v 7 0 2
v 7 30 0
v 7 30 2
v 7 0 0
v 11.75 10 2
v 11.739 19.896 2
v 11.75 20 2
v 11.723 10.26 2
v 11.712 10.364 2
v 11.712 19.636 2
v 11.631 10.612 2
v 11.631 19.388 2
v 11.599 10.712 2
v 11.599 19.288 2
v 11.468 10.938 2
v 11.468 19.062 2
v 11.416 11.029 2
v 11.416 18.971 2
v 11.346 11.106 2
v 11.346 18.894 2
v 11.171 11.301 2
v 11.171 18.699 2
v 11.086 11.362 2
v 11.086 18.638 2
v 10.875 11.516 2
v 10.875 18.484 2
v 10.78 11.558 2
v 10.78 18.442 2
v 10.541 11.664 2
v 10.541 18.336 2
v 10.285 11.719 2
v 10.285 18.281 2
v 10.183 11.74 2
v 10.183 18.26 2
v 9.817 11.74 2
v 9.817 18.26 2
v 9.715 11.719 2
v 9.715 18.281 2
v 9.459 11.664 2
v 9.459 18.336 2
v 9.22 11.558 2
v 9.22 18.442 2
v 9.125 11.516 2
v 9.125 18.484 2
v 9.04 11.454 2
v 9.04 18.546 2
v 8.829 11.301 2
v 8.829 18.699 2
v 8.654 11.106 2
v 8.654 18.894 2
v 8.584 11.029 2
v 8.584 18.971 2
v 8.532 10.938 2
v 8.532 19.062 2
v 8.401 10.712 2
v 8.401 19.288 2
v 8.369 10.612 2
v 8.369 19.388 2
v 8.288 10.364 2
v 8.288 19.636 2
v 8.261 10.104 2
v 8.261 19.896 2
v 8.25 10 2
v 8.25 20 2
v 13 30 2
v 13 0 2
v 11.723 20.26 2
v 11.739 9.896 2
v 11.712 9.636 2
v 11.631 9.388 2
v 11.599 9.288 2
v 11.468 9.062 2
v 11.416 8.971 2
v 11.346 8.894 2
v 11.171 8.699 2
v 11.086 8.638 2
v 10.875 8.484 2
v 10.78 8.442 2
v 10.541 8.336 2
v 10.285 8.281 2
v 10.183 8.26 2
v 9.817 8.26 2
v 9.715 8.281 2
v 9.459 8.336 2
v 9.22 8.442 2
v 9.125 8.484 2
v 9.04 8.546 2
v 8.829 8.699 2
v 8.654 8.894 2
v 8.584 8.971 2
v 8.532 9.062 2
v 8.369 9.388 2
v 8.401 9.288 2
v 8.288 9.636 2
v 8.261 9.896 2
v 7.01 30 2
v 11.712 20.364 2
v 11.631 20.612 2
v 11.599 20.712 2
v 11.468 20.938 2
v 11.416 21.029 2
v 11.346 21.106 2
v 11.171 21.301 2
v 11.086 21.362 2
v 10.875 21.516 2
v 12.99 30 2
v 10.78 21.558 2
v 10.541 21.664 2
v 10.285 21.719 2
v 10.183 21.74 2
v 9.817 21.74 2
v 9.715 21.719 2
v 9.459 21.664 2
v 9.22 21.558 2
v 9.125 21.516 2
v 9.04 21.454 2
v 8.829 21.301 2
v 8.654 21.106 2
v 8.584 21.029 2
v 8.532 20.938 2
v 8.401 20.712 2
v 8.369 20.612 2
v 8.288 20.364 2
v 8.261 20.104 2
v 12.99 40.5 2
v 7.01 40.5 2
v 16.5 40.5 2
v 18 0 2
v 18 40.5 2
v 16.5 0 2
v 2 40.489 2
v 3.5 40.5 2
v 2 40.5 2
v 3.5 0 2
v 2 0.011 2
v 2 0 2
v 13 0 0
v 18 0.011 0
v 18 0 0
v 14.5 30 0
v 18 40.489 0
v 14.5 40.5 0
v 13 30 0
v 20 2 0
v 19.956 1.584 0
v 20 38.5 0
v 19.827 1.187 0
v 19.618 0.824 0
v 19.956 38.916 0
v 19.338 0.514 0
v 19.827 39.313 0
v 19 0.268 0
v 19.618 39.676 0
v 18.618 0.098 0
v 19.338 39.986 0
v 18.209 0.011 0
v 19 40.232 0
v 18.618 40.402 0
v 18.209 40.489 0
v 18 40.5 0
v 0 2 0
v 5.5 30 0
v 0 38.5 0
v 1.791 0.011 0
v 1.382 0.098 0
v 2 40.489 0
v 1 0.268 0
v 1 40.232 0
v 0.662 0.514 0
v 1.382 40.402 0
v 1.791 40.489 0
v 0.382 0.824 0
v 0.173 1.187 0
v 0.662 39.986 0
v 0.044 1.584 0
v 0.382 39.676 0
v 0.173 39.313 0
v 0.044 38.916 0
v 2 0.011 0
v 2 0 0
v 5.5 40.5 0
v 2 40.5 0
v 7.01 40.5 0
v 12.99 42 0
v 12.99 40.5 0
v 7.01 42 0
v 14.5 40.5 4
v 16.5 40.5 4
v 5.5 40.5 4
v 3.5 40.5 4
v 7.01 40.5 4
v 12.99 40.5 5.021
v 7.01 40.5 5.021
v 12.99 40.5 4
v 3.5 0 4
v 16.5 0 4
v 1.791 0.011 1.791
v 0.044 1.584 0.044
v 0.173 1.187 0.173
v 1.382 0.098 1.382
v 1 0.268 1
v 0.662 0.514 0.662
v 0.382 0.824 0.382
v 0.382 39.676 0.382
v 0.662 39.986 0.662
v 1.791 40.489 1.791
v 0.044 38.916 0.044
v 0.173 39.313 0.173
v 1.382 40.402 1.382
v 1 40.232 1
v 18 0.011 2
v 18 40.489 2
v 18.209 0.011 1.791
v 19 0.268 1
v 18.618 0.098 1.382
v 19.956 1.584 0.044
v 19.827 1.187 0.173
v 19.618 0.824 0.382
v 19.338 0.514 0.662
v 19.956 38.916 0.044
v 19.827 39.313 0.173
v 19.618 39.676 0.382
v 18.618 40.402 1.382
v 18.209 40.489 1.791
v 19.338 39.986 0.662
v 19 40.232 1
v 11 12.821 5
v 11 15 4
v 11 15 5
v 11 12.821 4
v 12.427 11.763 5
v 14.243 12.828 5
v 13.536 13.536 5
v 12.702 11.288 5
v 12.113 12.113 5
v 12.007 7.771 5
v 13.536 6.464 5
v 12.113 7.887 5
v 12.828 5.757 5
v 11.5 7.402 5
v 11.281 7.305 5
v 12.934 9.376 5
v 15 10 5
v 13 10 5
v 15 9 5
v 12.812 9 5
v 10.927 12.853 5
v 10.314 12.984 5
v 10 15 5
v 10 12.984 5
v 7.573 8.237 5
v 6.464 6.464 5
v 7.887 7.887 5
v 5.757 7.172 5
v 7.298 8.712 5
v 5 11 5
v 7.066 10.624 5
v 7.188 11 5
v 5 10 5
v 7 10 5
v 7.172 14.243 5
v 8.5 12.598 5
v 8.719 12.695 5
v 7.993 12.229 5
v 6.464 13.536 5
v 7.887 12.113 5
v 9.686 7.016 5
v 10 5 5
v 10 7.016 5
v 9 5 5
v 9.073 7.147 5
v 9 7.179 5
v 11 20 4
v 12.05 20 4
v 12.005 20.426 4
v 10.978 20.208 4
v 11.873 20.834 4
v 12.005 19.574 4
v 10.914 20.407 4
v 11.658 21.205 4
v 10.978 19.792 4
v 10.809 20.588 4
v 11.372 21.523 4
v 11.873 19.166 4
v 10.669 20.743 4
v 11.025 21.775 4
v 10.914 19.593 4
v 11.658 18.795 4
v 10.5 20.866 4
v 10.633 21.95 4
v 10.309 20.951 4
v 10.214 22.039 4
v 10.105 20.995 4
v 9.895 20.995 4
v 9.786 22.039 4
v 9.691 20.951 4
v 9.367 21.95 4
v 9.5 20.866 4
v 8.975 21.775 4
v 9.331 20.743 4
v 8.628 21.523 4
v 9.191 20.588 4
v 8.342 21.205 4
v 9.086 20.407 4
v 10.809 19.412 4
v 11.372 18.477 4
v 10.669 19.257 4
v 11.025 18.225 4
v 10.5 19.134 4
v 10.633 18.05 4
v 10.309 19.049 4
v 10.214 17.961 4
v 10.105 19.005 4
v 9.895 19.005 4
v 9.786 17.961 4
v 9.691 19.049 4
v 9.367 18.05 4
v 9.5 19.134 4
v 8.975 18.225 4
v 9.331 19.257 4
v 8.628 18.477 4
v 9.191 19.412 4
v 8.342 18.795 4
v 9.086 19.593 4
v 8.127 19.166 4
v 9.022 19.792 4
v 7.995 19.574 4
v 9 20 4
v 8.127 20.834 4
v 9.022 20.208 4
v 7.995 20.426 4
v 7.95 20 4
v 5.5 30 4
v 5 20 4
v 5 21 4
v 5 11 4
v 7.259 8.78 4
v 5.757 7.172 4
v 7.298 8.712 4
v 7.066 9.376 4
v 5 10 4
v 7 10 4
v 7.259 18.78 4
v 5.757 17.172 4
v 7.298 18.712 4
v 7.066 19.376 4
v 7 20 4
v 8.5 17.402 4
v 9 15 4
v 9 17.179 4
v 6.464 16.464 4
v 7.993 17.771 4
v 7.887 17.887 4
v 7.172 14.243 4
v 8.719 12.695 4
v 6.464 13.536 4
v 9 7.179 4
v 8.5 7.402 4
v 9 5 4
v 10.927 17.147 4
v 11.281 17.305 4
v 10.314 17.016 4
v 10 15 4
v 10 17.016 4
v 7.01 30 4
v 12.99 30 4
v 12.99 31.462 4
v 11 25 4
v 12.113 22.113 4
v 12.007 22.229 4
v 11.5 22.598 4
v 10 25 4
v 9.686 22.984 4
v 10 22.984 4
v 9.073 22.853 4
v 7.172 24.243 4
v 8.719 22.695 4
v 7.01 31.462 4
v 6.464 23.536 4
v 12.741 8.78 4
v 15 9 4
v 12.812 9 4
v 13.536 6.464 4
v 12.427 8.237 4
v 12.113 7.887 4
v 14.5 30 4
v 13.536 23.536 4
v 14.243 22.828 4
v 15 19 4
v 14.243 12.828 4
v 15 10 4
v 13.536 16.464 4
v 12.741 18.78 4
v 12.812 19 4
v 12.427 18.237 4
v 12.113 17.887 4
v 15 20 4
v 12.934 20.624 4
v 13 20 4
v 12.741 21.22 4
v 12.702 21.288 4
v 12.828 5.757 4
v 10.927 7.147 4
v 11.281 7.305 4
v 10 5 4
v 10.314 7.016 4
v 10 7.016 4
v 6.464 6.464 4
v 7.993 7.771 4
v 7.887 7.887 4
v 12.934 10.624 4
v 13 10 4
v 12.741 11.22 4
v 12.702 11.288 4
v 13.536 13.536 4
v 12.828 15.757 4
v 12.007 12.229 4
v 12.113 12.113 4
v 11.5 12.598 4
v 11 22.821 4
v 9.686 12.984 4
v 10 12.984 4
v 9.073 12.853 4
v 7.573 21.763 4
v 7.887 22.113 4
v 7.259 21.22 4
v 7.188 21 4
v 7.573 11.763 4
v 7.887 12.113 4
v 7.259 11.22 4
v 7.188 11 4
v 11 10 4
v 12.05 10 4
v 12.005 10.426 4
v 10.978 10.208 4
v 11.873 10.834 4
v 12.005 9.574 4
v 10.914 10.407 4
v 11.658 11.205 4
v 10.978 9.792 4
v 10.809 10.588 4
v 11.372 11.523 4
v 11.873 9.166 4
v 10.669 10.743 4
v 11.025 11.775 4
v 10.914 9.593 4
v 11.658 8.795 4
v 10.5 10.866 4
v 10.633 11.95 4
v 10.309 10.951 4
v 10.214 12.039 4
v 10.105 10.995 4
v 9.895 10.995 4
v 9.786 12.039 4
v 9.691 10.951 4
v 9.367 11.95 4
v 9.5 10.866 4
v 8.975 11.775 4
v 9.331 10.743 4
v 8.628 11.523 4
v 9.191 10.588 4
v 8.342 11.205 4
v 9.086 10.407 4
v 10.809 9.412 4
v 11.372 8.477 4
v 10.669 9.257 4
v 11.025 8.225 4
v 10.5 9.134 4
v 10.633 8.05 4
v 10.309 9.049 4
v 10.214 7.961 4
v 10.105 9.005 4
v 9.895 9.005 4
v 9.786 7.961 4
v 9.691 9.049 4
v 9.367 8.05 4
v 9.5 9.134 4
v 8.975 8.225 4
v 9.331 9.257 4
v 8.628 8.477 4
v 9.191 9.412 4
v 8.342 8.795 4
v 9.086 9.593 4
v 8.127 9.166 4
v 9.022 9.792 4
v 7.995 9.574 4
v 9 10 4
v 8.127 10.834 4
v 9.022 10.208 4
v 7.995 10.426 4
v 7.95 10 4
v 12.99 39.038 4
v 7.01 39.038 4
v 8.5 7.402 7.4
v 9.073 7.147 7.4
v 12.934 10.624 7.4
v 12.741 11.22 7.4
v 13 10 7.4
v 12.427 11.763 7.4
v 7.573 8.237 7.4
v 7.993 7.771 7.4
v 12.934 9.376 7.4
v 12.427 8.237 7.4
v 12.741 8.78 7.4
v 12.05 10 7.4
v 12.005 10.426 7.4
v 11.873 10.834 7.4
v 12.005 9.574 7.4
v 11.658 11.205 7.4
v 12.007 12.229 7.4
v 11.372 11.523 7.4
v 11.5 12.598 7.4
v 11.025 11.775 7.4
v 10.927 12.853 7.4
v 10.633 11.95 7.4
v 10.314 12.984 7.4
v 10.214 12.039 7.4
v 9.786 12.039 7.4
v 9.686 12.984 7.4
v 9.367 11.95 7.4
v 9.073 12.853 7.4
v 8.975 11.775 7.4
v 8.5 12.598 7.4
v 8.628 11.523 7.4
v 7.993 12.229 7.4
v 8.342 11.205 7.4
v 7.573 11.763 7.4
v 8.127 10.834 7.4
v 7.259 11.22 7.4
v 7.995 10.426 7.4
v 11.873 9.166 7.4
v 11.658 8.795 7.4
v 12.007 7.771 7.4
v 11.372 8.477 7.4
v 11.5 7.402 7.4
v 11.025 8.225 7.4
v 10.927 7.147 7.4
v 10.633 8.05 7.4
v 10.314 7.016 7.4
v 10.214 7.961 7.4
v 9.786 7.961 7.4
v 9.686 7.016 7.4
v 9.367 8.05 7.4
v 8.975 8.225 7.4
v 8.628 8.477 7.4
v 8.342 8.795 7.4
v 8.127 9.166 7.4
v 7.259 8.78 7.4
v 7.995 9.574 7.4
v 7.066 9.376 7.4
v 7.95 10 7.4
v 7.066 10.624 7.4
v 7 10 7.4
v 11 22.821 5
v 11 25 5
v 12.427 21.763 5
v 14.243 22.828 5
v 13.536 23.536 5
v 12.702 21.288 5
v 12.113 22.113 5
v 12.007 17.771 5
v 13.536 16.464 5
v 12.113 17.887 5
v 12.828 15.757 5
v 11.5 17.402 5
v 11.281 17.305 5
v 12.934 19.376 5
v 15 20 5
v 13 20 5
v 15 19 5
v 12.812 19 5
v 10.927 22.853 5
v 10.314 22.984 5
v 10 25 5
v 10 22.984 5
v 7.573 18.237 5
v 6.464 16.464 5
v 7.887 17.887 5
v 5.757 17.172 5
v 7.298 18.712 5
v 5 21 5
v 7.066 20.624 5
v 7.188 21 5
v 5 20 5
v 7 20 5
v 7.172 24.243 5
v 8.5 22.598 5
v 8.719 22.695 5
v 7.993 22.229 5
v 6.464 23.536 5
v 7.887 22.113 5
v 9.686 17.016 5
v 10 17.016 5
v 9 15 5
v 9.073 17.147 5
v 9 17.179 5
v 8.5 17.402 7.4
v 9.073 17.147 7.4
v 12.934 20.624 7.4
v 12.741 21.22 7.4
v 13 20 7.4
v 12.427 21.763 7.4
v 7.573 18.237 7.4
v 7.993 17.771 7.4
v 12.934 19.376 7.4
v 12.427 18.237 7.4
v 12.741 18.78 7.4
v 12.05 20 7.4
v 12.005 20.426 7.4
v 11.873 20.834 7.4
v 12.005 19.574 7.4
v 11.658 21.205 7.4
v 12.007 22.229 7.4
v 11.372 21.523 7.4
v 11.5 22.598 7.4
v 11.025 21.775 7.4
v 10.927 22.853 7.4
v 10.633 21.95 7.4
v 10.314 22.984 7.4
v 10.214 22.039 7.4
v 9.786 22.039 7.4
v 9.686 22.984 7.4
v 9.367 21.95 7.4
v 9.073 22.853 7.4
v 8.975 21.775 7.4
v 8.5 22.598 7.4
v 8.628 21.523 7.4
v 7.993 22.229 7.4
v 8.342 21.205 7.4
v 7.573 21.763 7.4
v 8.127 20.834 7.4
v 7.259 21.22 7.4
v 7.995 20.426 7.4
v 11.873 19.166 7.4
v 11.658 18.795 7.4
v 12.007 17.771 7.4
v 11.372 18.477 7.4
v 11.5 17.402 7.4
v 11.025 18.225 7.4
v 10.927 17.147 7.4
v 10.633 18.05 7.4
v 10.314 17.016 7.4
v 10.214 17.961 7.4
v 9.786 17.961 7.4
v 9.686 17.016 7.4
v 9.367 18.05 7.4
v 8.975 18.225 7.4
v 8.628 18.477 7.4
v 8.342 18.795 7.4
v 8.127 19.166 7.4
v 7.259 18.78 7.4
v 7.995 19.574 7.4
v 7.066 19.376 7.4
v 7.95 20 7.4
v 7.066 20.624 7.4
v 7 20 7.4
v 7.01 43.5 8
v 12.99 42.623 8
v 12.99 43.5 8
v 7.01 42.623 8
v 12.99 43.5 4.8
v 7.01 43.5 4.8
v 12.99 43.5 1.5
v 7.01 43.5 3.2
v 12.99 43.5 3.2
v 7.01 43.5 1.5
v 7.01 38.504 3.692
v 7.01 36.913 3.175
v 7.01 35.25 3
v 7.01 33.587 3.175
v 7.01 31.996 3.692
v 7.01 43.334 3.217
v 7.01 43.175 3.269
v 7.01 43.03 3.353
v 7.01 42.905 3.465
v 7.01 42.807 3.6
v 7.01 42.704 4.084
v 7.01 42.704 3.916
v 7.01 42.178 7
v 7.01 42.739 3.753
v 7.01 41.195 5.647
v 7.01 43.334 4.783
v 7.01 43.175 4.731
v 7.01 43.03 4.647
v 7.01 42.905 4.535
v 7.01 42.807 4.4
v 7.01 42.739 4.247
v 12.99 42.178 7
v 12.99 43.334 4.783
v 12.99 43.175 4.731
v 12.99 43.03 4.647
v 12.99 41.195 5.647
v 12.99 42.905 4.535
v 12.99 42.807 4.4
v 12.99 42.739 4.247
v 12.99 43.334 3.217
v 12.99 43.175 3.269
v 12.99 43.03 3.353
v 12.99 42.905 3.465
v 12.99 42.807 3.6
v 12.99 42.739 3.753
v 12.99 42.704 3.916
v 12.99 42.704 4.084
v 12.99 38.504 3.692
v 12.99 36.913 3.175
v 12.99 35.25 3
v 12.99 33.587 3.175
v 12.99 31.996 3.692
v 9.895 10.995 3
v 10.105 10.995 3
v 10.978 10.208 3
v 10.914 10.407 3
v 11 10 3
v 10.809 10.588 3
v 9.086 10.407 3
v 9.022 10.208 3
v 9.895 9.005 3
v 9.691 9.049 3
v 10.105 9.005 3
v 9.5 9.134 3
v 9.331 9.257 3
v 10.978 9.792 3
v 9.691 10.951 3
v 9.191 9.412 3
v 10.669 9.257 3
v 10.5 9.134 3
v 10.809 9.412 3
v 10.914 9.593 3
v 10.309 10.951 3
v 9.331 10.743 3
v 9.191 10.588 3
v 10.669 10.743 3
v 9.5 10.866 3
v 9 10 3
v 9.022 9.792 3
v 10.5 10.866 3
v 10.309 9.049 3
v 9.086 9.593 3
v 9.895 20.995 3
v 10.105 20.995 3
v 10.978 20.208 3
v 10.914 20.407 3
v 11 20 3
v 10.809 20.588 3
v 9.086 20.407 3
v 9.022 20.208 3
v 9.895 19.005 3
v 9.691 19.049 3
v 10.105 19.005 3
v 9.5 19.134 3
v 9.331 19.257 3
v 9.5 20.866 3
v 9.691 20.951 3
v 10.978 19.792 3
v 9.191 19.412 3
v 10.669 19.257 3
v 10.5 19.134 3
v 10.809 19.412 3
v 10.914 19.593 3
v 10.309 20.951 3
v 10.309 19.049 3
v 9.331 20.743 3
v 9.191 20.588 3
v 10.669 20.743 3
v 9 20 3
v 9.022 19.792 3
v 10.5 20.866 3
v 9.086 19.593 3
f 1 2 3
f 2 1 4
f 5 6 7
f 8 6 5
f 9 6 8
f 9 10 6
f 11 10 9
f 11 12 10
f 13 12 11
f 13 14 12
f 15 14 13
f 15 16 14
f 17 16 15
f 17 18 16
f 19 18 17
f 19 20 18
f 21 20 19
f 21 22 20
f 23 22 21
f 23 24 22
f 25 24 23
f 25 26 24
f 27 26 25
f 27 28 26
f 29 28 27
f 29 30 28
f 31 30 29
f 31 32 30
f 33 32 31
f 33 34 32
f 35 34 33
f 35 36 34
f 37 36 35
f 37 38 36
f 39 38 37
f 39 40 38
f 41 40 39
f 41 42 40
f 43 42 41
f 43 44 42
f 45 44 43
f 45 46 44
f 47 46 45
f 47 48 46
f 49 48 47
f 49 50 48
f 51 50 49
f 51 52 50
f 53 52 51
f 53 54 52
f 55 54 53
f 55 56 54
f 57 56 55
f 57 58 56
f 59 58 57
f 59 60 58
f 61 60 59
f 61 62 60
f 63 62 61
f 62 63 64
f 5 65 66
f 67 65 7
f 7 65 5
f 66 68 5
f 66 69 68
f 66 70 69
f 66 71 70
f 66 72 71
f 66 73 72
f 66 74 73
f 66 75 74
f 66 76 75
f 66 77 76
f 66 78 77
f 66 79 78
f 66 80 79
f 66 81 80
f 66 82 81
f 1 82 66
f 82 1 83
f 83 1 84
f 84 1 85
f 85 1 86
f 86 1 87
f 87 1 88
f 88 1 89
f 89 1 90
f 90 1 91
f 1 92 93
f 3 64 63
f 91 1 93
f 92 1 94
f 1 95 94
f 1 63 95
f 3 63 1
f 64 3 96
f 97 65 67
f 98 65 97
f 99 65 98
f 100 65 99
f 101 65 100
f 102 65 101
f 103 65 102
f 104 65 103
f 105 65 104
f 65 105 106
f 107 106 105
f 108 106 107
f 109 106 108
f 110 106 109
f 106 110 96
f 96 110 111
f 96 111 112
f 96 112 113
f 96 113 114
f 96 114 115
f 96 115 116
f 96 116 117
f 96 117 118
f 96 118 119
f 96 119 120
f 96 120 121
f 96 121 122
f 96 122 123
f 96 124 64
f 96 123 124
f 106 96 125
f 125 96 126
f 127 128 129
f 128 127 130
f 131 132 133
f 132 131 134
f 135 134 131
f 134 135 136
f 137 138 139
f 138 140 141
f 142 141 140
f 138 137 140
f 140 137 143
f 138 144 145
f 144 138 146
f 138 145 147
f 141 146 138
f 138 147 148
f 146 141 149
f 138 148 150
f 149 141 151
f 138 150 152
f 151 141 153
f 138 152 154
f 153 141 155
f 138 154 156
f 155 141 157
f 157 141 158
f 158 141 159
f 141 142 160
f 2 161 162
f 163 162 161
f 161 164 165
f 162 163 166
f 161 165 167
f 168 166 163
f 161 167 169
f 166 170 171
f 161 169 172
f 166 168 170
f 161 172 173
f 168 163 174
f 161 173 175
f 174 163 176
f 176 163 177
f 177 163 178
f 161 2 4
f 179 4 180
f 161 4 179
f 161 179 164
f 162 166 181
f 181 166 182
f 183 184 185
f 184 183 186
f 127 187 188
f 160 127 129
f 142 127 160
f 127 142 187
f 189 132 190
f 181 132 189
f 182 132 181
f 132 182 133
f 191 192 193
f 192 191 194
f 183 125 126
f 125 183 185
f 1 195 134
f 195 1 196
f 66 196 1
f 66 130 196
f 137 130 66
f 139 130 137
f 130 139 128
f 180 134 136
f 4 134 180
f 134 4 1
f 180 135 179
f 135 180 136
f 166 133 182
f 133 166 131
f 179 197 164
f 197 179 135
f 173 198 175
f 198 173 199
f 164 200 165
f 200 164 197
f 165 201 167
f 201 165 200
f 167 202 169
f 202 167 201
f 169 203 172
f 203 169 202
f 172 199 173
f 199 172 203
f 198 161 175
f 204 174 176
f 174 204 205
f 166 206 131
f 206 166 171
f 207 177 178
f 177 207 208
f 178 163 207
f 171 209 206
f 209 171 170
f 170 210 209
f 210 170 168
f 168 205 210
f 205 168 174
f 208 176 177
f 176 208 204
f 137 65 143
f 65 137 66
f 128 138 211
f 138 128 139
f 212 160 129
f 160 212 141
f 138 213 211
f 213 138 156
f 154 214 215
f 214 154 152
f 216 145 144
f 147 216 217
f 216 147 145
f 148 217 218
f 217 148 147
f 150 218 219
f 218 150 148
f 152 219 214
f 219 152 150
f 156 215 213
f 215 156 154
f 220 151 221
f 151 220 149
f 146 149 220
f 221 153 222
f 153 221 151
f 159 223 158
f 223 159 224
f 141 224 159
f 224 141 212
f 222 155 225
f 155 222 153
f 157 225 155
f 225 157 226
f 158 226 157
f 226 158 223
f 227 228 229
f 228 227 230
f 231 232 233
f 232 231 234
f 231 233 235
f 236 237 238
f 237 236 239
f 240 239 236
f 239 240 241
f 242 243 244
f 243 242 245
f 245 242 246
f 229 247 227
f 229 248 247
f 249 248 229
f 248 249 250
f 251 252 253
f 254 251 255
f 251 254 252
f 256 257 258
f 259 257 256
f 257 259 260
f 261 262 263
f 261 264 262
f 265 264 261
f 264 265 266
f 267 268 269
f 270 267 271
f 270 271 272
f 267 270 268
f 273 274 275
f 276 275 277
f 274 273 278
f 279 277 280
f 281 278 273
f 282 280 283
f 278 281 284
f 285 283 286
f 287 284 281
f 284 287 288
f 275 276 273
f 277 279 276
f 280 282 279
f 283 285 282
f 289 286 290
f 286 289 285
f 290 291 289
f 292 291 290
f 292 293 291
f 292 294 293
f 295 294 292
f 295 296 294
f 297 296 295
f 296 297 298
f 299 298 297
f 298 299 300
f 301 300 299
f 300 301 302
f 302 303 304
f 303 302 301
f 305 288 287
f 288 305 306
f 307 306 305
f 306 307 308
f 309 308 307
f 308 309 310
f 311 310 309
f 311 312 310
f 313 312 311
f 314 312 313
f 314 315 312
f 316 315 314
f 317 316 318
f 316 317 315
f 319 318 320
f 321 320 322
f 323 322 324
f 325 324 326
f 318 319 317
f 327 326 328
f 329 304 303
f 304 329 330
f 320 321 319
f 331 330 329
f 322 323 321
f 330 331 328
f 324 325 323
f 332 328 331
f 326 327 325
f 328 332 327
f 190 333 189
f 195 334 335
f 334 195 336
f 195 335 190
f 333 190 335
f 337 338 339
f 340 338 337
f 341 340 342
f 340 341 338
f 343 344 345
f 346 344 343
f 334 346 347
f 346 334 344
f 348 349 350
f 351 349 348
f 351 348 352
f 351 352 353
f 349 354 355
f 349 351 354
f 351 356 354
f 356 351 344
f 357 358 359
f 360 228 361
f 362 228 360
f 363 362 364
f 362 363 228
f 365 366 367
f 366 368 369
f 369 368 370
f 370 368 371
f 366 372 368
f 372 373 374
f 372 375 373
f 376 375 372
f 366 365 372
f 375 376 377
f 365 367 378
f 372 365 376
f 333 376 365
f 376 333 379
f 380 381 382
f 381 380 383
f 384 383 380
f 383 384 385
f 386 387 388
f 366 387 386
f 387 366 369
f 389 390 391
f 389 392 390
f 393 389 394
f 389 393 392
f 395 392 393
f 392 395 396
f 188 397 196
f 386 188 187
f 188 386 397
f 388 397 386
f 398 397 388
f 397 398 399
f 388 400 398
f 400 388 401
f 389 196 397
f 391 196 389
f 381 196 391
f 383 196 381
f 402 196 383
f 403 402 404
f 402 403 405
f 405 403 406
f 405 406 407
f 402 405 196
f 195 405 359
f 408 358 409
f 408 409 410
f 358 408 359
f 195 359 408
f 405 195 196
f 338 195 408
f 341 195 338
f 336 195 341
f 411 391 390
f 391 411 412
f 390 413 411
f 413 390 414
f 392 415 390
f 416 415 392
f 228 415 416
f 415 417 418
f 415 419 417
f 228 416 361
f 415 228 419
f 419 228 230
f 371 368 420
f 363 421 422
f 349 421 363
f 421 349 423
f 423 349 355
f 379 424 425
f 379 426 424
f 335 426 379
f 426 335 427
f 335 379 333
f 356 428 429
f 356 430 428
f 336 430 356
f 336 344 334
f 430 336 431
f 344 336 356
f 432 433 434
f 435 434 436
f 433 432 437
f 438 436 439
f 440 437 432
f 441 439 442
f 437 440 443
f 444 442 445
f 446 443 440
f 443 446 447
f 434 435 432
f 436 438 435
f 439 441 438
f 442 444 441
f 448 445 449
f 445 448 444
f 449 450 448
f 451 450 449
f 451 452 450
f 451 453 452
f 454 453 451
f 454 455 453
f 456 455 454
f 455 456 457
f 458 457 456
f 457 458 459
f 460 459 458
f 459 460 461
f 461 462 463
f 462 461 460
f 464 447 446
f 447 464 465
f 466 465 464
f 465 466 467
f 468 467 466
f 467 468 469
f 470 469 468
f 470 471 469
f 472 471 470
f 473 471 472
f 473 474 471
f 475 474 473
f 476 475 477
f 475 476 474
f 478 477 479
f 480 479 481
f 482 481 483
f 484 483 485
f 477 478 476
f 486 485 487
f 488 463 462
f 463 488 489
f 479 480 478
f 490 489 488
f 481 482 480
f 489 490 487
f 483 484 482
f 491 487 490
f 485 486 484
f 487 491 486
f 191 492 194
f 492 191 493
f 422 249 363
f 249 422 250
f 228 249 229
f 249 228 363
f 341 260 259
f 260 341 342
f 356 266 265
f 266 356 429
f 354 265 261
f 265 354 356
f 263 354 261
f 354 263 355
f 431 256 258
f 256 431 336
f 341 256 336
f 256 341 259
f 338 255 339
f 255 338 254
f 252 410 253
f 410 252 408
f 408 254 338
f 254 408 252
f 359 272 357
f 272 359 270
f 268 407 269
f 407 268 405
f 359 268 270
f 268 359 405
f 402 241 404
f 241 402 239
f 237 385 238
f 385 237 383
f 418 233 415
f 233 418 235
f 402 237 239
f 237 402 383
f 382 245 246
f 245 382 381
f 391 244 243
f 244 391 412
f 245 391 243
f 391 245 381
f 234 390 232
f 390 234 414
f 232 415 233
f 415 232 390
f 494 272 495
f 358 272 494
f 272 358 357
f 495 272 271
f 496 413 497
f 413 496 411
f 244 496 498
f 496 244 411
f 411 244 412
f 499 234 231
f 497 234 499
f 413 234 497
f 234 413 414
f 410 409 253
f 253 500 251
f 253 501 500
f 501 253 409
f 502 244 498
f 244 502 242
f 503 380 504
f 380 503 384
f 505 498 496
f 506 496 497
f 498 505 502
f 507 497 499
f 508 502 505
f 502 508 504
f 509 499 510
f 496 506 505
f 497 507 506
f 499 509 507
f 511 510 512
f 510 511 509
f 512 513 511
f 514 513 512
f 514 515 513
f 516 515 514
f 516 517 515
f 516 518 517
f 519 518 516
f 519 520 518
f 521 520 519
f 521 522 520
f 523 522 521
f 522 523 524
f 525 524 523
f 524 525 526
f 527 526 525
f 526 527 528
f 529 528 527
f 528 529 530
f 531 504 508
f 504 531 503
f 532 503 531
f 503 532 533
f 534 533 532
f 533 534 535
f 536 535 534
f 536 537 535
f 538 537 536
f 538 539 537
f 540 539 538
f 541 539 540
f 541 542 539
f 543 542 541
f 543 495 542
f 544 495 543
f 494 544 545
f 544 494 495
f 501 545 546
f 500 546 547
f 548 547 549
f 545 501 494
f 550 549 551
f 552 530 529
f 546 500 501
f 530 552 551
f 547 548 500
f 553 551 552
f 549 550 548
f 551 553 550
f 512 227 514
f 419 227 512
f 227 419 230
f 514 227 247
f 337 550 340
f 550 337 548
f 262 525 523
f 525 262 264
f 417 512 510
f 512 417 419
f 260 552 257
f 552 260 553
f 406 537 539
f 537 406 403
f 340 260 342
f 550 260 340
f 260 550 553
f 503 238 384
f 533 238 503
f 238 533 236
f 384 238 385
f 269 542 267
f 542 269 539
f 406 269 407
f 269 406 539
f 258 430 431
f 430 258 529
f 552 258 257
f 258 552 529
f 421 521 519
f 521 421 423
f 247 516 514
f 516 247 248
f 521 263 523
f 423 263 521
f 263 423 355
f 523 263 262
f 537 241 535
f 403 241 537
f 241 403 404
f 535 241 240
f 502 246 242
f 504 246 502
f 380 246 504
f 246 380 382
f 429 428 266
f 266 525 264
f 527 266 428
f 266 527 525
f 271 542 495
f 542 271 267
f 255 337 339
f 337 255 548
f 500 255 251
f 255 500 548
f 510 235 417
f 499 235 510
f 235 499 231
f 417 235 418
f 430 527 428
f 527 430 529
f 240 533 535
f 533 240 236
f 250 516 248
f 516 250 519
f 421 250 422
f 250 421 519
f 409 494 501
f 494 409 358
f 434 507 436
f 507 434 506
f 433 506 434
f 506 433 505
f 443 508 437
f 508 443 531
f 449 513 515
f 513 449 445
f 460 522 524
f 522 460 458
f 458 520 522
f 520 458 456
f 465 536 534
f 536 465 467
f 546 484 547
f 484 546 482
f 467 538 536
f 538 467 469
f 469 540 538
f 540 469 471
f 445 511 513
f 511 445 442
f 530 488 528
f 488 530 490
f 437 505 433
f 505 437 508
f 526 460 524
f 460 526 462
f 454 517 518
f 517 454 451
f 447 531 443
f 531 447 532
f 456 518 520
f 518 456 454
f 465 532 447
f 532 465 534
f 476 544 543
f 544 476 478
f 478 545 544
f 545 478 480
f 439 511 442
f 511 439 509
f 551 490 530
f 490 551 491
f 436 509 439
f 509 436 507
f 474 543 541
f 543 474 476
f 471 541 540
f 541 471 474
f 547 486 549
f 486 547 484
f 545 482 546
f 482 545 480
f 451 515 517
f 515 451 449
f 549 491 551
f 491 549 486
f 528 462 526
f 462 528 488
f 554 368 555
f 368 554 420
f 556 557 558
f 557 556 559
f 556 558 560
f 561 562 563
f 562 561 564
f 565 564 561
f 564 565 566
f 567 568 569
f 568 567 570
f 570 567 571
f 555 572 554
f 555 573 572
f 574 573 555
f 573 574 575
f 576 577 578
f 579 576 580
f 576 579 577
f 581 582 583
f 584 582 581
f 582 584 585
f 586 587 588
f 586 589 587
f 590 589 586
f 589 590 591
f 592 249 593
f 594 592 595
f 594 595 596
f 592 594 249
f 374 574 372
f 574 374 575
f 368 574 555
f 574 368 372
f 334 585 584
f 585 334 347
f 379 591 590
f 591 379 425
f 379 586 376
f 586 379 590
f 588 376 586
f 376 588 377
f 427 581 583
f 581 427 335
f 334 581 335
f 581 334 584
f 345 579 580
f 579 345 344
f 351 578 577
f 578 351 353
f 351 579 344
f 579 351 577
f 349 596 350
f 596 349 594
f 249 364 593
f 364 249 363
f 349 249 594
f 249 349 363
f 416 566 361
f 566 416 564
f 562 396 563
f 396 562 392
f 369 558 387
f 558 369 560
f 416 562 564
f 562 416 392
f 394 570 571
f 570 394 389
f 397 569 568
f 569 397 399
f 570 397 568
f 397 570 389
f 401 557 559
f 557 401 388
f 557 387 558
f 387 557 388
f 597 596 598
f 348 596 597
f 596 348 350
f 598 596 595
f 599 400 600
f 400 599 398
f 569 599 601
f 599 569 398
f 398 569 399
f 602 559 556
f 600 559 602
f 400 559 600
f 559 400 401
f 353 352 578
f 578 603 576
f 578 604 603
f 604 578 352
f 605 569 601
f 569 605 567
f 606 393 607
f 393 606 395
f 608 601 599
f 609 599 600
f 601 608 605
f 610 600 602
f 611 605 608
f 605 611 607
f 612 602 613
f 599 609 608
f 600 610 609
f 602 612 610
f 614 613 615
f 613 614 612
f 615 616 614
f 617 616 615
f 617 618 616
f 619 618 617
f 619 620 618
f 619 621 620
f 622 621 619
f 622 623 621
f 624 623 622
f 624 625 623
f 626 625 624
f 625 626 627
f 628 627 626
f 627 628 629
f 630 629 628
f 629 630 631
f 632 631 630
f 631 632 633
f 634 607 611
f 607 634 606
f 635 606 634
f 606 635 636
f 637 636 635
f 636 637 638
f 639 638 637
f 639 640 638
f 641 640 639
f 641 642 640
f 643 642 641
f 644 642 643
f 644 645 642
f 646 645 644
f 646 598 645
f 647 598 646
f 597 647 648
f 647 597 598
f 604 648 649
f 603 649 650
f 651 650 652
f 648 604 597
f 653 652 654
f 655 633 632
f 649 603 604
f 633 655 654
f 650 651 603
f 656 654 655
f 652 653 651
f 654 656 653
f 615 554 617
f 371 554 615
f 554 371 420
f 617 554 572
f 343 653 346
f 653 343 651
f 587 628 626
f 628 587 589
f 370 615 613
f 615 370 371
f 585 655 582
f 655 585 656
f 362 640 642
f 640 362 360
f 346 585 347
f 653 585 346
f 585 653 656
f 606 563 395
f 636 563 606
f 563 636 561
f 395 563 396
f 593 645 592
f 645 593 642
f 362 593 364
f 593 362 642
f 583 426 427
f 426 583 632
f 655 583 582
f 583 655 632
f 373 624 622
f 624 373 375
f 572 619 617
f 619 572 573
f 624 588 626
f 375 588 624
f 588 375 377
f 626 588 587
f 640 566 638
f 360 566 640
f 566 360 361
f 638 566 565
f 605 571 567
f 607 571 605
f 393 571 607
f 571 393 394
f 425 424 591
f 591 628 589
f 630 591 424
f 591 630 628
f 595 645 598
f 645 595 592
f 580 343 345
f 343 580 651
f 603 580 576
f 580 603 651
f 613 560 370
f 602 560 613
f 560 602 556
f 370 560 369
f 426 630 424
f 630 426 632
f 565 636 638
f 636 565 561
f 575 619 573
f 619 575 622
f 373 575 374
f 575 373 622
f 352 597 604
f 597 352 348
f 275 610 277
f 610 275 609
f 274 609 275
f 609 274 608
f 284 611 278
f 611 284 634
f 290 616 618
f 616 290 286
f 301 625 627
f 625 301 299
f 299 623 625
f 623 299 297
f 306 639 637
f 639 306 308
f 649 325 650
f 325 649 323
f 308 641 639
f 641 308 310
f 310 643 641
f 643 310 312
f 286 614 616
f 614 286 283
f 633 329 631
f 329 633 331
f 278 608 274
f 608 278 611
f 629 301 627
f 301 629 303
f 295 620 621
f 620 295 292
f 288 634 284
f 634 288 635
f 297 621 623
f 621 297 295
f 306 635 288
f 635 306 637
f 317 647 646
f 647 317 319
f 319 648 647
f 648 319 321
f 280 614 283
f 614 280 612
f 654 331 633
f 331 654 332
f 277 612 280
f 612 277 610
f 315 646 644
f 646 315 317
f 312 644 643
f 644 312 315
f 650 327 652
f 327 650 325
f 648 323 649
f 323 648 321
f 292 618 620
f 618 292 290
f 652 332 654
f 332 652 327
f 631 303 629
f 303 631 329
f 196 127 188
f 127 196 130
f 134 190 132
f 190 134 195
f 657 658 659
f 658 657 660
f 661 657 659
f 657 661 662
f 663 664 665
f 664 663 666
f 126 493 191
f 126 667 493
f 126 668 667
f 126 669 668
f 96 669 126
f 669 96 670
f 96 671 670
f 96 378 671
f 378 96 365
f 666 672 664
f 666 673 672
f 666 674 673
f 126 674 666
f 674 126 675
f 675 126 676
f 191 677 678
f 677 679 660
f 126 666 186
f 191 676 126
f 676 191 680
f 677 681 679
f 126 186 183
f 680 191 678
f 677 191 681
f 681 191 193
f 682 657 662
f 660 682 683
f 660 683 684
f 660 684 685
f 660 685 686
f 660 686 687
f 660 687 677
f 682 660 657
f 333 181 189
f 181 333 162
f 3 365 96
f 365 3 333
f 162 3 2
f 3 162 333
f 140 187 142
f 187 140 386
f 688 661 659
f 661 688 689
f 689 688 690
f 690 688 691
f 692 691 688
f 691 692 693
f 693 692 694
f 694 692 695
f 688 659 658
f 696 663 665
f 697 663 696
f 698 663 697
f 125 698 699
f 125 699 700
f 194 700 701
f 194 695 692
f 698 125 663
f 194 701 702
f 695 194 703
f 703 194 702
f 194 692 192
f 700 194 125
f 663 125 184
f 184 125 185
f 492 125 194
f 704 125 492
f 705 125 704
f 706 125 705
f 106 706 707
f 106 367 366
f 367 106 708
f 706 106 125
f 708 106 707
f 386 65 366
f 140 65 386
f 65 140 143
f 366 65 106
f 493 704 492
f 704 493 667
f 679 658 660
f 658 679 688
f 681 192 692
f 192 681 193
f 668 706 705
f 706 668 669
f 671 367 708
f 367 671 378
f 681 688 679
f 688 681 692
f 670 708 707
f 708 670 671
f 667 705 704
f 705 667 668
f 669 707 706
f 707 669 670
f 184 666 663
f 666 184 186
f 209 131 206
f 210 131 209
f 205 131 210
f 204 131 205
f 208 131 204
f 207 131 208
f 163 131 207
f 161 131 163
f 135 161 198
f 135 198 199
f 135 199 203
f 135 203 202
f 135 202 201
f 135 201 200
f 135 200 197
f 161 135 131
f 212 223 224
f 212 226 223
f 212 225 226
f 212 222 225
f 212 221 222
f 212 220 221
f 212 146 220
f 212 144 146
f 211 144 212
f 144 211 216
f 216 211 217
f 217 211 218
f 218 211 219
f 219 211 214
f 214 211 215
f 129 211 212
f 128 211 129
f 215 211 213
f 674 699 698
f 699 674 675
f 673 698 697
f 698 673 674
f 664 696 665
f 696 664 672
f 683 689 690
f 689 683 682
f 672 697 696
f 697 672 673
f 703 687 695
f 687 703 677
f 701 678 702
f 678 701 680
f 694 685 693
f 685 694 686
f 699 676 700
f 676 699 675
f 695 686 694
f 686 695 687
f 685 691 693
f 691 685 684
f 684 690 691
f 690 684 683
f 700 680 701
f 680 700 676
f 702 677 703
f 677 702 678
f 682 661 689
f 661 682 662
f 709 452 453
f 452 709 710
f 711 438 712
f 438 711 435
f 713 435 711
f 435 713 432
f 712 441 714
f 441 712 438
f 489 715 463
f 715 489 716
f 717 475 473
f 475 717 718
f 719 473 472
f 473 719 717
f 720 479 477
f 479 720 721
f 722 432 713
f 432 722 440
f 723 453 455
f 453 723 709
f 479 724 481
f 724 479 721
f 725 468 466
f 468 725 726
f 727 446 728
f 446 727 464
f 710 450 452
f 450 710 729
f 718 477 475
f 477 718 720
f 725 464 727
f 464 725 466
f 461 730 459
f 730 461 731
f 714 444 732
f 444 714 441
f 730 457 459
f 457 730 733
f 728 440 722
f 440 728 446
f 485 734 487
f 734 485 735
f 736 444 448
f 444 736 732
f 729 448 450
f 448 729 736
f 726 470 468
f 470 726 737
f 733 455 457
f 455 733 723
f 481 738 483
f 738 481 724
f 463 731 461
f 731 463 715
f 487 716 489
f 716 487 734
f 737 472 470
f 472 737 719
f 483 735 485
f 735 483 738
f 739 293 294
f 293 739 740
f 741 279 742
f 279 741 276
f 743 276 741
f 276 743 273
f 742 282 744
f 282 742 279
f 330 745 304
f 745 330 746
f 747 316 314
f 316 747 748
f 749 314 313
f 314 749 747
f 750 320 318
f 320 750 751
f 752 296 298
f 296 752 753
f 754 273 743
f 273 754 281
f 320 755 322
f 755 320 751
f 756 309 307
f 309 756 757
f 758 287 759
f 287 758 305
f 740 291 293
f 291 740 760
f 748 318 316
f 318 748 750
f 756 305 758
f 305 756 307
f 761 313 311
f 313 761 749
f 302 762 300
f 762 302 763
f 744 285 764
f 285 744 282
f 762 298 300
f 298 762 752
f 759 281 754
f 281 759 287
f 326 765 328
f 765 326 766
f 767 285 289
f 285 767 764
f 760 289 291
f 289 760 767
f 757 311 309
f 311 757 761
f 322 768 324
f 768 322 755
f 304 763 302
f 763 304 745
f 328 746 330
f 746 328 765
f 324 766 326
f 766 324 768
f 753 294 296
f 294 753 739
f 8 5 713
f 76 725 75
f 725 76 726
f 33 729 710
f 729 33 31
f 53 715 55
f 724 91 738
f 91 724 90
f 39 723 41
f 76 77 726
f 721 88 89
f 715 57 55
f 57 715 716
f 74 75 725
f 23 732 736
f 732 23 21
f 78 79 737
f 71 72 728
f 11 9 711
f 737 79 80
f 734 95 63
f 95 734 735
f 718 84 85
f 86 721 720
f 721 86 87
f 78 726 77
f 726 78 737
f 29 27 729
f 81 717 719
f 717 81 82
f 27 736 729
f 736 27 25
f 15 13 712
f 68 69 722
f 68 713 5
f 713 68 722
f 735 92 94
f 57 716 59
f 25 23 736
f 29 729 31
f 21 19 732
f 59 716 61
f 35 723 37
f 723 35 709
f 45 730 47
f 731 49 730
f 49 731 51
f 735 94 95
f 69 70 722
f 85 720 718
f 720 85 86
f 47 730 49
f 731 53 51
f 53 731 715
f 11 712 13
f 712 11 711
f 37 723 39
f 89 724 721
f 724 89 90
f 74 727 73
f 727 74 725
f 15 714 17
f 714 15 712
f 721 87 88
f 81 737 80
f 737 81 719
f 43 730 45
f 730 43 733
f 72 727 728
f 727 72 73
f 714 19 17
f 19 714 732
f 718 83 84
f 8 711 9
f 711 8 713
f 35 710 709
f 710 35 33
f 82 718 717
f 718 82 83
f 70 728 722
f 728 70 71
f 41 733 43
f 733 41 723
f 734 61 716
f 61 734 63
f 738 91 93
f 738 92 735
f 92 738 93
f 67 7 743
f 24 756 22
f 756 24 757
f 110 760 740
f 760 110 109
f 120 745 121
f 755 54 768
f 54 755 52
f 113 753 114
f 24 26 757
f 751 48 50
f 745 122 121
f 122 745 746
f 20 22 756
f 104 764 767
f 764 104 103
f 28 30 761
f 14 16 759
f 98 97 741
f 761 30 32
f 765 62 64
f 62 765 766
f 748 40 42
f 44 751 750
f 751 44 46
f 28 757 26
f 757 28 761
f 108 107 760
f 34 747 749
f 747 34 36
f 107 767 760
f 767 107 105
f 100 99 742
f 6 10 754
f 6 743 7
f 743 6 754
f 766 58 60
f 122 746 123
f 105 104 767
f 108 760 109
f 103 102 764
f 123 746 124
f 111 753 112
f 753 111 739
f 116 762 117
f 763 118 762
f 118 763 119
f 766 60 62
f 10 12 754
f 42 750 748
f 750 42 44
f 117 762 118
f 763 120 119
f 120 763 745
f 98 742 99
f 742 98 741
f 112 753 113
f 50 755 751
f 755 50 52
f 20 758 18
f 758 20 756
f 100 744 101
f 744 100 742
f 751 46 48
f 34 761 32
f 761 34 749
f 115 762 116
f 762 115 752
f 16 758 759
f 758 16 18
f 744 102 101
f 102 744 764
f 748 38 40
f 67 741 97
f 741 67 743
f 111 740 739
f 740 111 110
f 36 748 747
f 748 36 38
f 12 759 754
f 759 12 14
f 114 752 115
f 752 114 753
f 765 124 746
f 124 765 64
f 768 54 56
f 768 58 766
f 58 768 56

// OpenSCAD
// Catepilar S61 - Clip to hold Military Case
// 2026-04-13, Ondrej DURAS (dury) NOKIA
// prichytenie mobilu : priviazane o snurku drzi vojenske ocharrne puzro na mobilny telefon CatS61
// dva moduly; slider - spodna zasuvna cast a cover - zakrytka zvierajuca snurku k slideru.
// pevne pojenie bude realizovane dvoma samoreznymi skrutkami
//include <003-roundedCube-lib.scad>

/* [Viever] */
preview="basic";    // [basic,cover,slider,plate]
distance=5;        // [0:1:50] vzdialenost kritky od podlozky
$fn=30;

/* [Dimensions] */
spi=0.1;            // spacing povrchu vnutornej suciatky sucheho spoja - pravidlo: I sa strka do O
spo=0.1;            // spacing povrchu vonkajsej suciastky sucheho spoja - I treba obvikle zuzit, O rozsirit aby sa veci do seba dali zasunut
roundedRadius=2.0;  // polomer zabrusenia hran slidera
roundedRadiusBig=4.5; 
sliderDepthM=40.5;  // celkova hlbka Slidera ... v podstate sirka, hlavny rozmer
sliderDepthL=30.0;  // hlbka lavej(blizsie k X)-celistvej casti slidera
sliderDepthR=10.5;  // hlbka pravej(dalej od X)-zarezanej casti slidera 
sliderWidthM=20.0;  // celkova sirka slidera
sliderWidthT=13.0;  // sirka horneho-noseneho pasu slidera
sliderWidthB=7.0;   // sirka spodneho-leziaceho pasika slidera (su dva, kazdy 6.0mm podla originalu, ale skusime 7.0mm)
sliderHightM=4.0;   // celkova vyska slidera - oboch pasikov dohromady
sliderHightB=2.0;   // vyska spodnych-leziacich dvoch pasikov slidera
sliderHightT=2.0;   // vyska horneho-noseneho pasika slidera
sliderCutLen=10.5;  // dlzka zarezu do slidera .. su dva
sliderCutTck=1.51;  // hrubka (Tick) zarezu do sldera .. su dva (merany original 1.5)
sliderCutDis=5.5;   // vzdialenost okraja zarezu od okraja slidera
sliderTipWid=8.0;   // sirka drziaceho hrotu i vyhynacieho jazycka
sliderTipDis=6.0;   // okraj jazycka/hrotu od okraja slidera // druhy okraj vyrezu // =poloha+sirka vyrezu
sliderTipDep=3.0;   // v podstate hrubka hrotu
sliderTipHig=8.0;   // vyska hrotu od podlozky
sliderCylRad=8.0;   // polomer cylindra, sluziaceho k pruznemu vyrezu
screwBodyM=2.0;     // priemer tela skrutky asi 2.0mm, este premerat
screwHeadM=5.0;     // ten najvacsi priemer hlavy skruptky, merany na asi 5.0, premerat este raz
screwHeadH=2.0;     // vyska hlavy skrutky
ferulaTick=1.0;     // hrubka steny ferule, teda kuzela s dierou, do ktorej pojde skrutka
ferulaHolders=8;    // pocet drziacikov, ktore zvysuju pevnost refule - zvacsuju plochu zakladne ktorou vznika prepoj medzi ferulou a suciastkou
ferulaHight=7.0;    // REFERENCNY rozmer - vyska vnutorneho pristoru pod coverom/krytkou ... urcuje vysku krytku
coverTick=1.0;      // hrubka materialu cover-a

/* [Colors] */
colorSliderBottom="#908010"; // farba spodnych dvoch pasikov slidera
colorSliderTop="#706008";    // farba horneho pasika slidera
colorFerulaFemale="#701010"; // Farba valcovej objimky na slideri, ktora do ktorej sa zasunie FerulaMale z covera
colorFerulaMale="#108080";   // Farba valcovej objimky na coveri s dierou, do ktorej pojde pridrzajuca skrutka
colorScrew="#108020";        // farba skrutky
colorCover="#407040";        // farba krytky/cover-a

module ferulaFemale() {
    difference() {
        union() {
            cylinder(h=ferulaHight/2-spi,d=screwBodyM+4*ferulaTick);
            for(i=[0:360/ferulaHolders:360]) {
                rotate([0,0,i])
                cube([ferulaTick,screwBodyM+3*ferulaTick,ferulaTick]);
            }
        }
        translate([0,0,-1])
        cylinder(h=ferulaHight/2-spi+2,d=screwBodyM+2*ferulaTick+spo);
    }
}
module ferulaMale() {
    difference() {
        union() {
            cylinder(h=ferulaHight/2-spi,d=screwBodyM+4*ferulaTick);
            for(i=[0:360/ferulaHolders:360]) {
                rotate([0,0,i])
                cube([ferulaTick,screwBodyM+3*ferulaTick,ferulaTick]);
            }
            cylinder(h=ferulaHight-spi,d=screwBodyM+2*ferulaTick-spi);
        }
        translate([0,0,-1])
        cylinder(h=ferulaHight-spi+2,d=screwBodyM);
    }
    
}

module roundedCoverUp(w,d,h,r1,r2) {  // sirka, hlbka/dlzka, vyska/hrubka, polomer velkeho zaoblenia, polomer malych hran
    union() {
    difference() {
        cube([w,d,h]);
        translate([-1,d-r1,h-r1])
            cube([w+2,r1+1,r1+1]);      // vyrez pre velke zaoblenie (vzadu hore)
        translate([-1,-1,h-r2])
            cube([r2+1,d+2,r2+1]);  // lavy horny vyrez pre okrajove zaoblenie
        translate([w-r2,-1,h-r2])
            cube([r2+1,d+2,r2+1]);  // pravy horny vyrez pre okrajove zaoblenie
        translate([-1,d-r2,-1])
            cube([r2+1,r2+1,h+2]);  // vyrez pre zaoblenie vlavo vzadu
        translate([w-r2,d-r2,-1])
            cube([r2+1,r2+1,h+2]);  // vyrez pre zaoblenie vpravo vzadu
    } // diff
        translate([r2,d-r1,h-r1])
            rotate([0,90,0])
            cylinder(h=w-2*r2,r=r1); // velke zaoblenie vzadu hore
        translate([r2,0,h-r2])
            rotate([-90,0,0])       // lave horne zaoblenie
            cylinder(h=d-r1,r=r2);
        translate([w-r2,0,h-r2])
            rotate([-90,0,0])       // prave horne zaoblenie
            cylinder(h=d-r1,r=r2);
        translate([r2,d-r2,0])
            cylinder(h=h-r1,r=r2);  // lave zadne zaoblenie
        translate([w-r2,d-r2,0])
            cylinder(h=h-r1,r=r2);  // prave zadne zaoblenie


        translate([r2,d-r1,h-r1])   // velke zaoblenie v lavom hornom rohu
            rotate([0,-90,0])
            //rotate_extrude(angle=90,start=0,convexity=100)
            rotate_extrude(angle=90,convexity=20)
                translate([r1-r2,0,0])
                circle(r=r2);

        translate([w-r2,d-r1,h-r1])   // velke zaoblenie v lavom hornom rohu
            rotate([0,-90,0])
            //rotate_extrude(angle=90,start=0,convexity=100)
            rotate_extrude(angle=90,convexity=20)
                translate([r1-r2,0,0])
                circle(r=r2);

        translate([0,d-r1,h-r1])  // vyplnenie dier na velkom zaobleni z oboch stran pomocou valca
            rotate([0,90,0])
            cylinder(h=w,r=r1-r2);
    } // union
}

module roundedCoverDown(w,d,h,r1,r2) {  // zaoblena krytka otocena dnom dole v zakladnej polohe
                                        //sirka,hlbka/dlzka,vyska/hrubka,polomer velkeho zaoblenia vzadu,polomer malych zaobleni po stranach
                                        // z pohladu komponent zjednodusena ...ovsem nedokonala verzia
    union() {
    difference() {
        cube([w,d,h]);             // zakladny kvader
        translate([r2-0.1,d-r1,-1])
            cube([w-2*r2+0.2,r1+1,r1+1]);  //vyrez pre velke zaoblenie

        translate([-1,-1,-1])
            cube([r2+1,d+2,r2+1]);  // lavy dolny vyrez
        translate([w-r2,-1,-1])
            cube([r2+1,d+2,r2+1]); //pravy dolny vyrez
        translate([-1,d-r2,-1])
            cube([r2+1,r2+1,h+2]);  // lavy zadny vyrez 
        translate([w-r2,d-r2,-1])
            cube([r2+1,r2+1,h+2]);  // lavy zadny vyrez 
        
    } //diff
        translate([r2,0,r2])
            rotate([-90,0,0])
            cylinder(h=d-r1,r=r2);  // lave dolne zaoblenie
        translate([w-r2,0,r2])
            rotate([-90,0,0])
            cylinder(h=d-r1,r=r2);  // prave dolne zaoblenie
        translate([r2,d-r2,r1])
            cylinder(h=h-r1,r=r2);  // lave zadne zaoblenie
        translate([w-r2,d-r2,r1])
            cylinder(h=h-r1,r=r2);  // prave zadne zaoblenie
        translate([r2,d-r1,r1])
            rotate([0,90,0])
            cylinder(h=w-2*r2,r=r1);  // zadne dolne velke zaoblenie


        translate([r2,d-r1,r1])   // velke zaoblenie v lavom hornom rohu
            rotate([0,90,0])
            //rotate_extrude(angle=90,start=0,convexity=100)
            rotate_extrude(angle=90,convexity=20)
                translate([r1-r2,0,0])
                circle(r=r2);

        translate([w-r2,d-r1,r1])   // velke zaoblenie v lavom hornom rohu
            rotate([0,90,0])
            //rotate_extrude(angle=90,start=0,convexity=100)
            rotate_extrude(angle=90,convexity=20)
                translate([r1-r2,0,0])
                circle(r=r2);

    } //union
}
module roundedCubeHightLeft(w=sliderWidthB,d=sliderDepthM,h=sliderHightB,r=roundedRadius) {
    union() {
        difference() {
            cube([w,d,h],center=false);  //zakladny kvader, ktory sa ide orezavat
            translate([-1,-1,-1])
                cube([r+1,r+1,h+2]);     // vyrez vlavo vpredu
            //translate([w-r,-1,-1])            
            //    cube([r+1,r+1,h+2]);   // vyrez vpravo vpredu
            translate([-1,d-r,-1])
                cube([r+1,r+1,h+2]);     // vyrez vlavo vzadu
            //translate([w-r,d-r,-1])
            //    cube([r+1,r+1,h+2]);   // vyrez vpravo vzadu
        } // difference
            translate([r,r,0])
                cylinder(h=h,r=r);       // cylinder zaoblenia vlavo vpredu
            //translate([w-r,r,0])            
            //    cylinder(h=h,r=r);     // cylinder zaoblenia vpravo vpredu
            translate([r,d-r,0])
                cylinder(h=h,r=r);       // cylinder zaoblenia vlavo vzadu
            //translate([w-r,d-r,0])
            //    cylinder(h=h,r=r);     // cylinder zaoblenia vpravo vzadu
    } // union

}

module roundedCubeHightRight(w=sliderWidthB,d=sliderDepthM,h=sliderHightB,r=roundedRadius) {
    union() {
        difference() {
            cube([w,d,h],center=false);  //zakladny kvader, ktory sa ide orezavat
            //translate([-1,-1,-1])
            //    cube([r+1,r+1,h+2]);   // vyrez vlavo vpredu
            translate([w-r,-1,-1])            
                cube([r+1,r+1,h+2]);     // vyrez vpravo vpredu
            //translate([-1,d-r,-1])
            //    cube([r+1,r+1,h+2]);   // vyrez vlavo vzadu
            translate([w-r,d-r,-1])
                cube([r+1,r+1,h+2]);     // vyrez vpravo vzadu
        }
            //translate([r,r,0])
            //    cylinder(h=h,r=r);     // cylinder zaoblenia vlavo vpredu
            translate([w-r,r,0])            
                cylinder(h=h,r=r);       // cylinder zaoblenia vpravo vpredu
            //translate([r,d-r,0])
            //    cylinder(h=h,r=r);     // cylinder zaoblenia vlavo vzadu
            translate([w-r,d-r,0])
                cylinder(h=h,r=r);       // cylinder zaoblenia vpravo vzadu
    }

}

module slider() {  // spodna zasuvacia cast 
// zakladnou polohou je poloha na plate
// referencny bod je vlavo dole v zadu
    difference() {
    union() {
        color(colorSliderBottom)
        translate([0,0,0])
            //cube([sliderWidthB,sliderDepthM,sliderHightB]); // lavy leziaci pasik
            roundedCubeHightLeft(sliderWidthB,sliderDepthM,sliderHightB,2); // lavy leziaci pasik
        color(colorSliderBottom)
        translate([sliderWidthM-sliderWidthB,0,0])
            //cube([sliderWidthB,sliderDepthM,sliderHightB]); // pravy leziaci pasik
            roundedCubeHightRight(sliderWidthB,sliderDepthM,sliderHightB,2); // pravy leziaci pasik
        color(colorSliderTop)
        translate([(sliderWidthM-sliderWidthT)/2,0,sliderHightB])
            cube([sliderWidthT,sliderDepthM,sliderHightT]); // horny noseny pasik
        color(colorSliderTop)
        translate([sliderTipDis,sliderDepthM,0]) // hlavny kvader hrotu prichytenia, z kvoreho sa bude rezat
            cube([sliderTipWid,sliderTipDep,sliderTipHig]);


        color(colorSliderBottom)                            // prva ferula od predneho okraja
            translate([sliderWidthM/2,1*sliderDepthL/3,sliderHightM])
            ferulaFemale();
        color(colorSliderBottom)                            // druha ferula od predneho okraja
            translate([sliderWidthM/2,2*sliderDepthL/3,sliderHightM])
            ferulaFemale();
    } //union
        color(colorSliderTop)
        translate([sliderCutDis,sliderDepthL,-1])
            cube([sliderCutTck,sliderDepthR+sliderTipDep+1,sliderTipHig+2]); // lavy zarez
        color(colorSliderTop)
        translate([sliderWidthM-sliderCutDis-sliderCutTck,sliderDepthL,-1])
            cube([sliderCutTck,sliderDepthR+sliderTipDep+1,sliderTipHig+2]); //pravy zarez
        color(colorSliderTop)
        translate([sliderTipDis,sliderDepthM-sliderDepthR/2,sliderCylRad+sliderHightM-1])
            rotate([0,90,0])
            cylinder(h=sliderTipWid,r=sliderCylRad); // valcovity vyrez, ktory by mal umoznit pruznost
        color(colorSliderTop)
        translate([0,sliderDepthM+sliderTipDep/2,0])
            rotate([-45,0,0])
            cube([sliderWidthM,sliderTipDep,sliderTipHig]); // skosenie hrotu prichytenia
        color(colorSliderBottom)
            rotate([0,45,0])
            translate([-sliderHightB,-1,0])
            cube([sliderHightB,sliderDepthM+2,sliderHightM]); // skosenie lavej strany slidera
        color(colorSliderBottom)
            translate([sliderWidthM,-1,0])
            rotate([0,-45,0])
            cube([sliderHightB,sliderDepthM+2,sliderHightM]); // skosenie pravej strany slidera
        color(colorSliderTop)
            translate([sliderTipDis,sliderDepthM+sliderTipDep,sliderTipHig/2])
            rotate([0,90,0])
            cylinder(h=sliderTipWid,d=sliderTipHig/5);
        color(colorSliderBottom)                            // diera pre prvu skrutku od predneho okraja
            translate([sliderWidthM/2,1*sliderDepthL/3,0])
            cylinder(h=sliderHightM+1,d=screwBodyM);
        color(colorSliderBottom)                            // diera pre druhu skrutku od predneho okraja
            translate([sliderWidthM/2,2*sliderDepthL/3,0])
            cylinder(h=sliderHightM+1,d=screwBodyM);

        color(colorScrew)                                   // vyhlbenie pre hlavu prvej skrutky od predneho okraja
            translate([sliderWidthM/2,1*sliderDepthL/3,sliderHightB/2])
            cylinder(h=screwHeadH,d1=screwHeadM,d2=screwBodyM);
        color(colorScrew)                                   // vyhlbenie pre hlavu druhej skrutky od predneho okraja
            translate([sliderWidthM/2,2*sliderDepthL/3,sliderHightB/2])
            cylinder(h=screwHeadH,d1=screwHeadM,d2=screwBodyM);

    } //diff

}

module cover() {   // zakrytka zvierajuca snurku k zasuvacej casti
// zakladnou polohou je poloha na plate, teda chrbatom dole.
// referencny bod je vlavo dole v zadu na chrbate
    union() {
    difference() {
        color(colorCover)
            //cube([sliderWidthT,sliderDepthL,ferulaHight+coverTick+sliderHightT]);
            roundedCoverDown(sliderWidthT,sliderDepthL,ferulaHight+coverTick+sliderHightT,roundedRadiusBig,roundedRadius);
        color(colorCover)
            translate([coverTick,-1,coverTick])
            //cube([sliderWidthT-2*coverTick,sliderDepthL-coverTick+1,ferulaHight+coverTick+sliderHightT]);
            roundedCoverDown(sliderWidthT-2*coverTick,sliderDepthL-coverTick+1,ferulaHight+coverTick+sliderHightT,roundedRadiusBig,roundedRadius);
    } //diff
        color(colorSliderBottom)                            // prva ferula od predneho okraja
            translate([sliderWidthT/2,1*sliderDepthL/3,coverTick])
            ferulaMale();
        color(colorSliderBottom)                            // druha ferula od predneho okraja
            translate([sliderWidthT/2,2*sliderDepthL/3,coverTick])
            ferulaMale();
    } //union
}

if(preview=="basic") {
    slider();     
}
if(preview=="slider") {
    slider();
}
if(preview=="cover") {
    cover();
}
if(preview=="plate") {
    translate([0,0,0])
        slider();

    translate([sliderWidthM+distance,0,0])
        cover();
}
